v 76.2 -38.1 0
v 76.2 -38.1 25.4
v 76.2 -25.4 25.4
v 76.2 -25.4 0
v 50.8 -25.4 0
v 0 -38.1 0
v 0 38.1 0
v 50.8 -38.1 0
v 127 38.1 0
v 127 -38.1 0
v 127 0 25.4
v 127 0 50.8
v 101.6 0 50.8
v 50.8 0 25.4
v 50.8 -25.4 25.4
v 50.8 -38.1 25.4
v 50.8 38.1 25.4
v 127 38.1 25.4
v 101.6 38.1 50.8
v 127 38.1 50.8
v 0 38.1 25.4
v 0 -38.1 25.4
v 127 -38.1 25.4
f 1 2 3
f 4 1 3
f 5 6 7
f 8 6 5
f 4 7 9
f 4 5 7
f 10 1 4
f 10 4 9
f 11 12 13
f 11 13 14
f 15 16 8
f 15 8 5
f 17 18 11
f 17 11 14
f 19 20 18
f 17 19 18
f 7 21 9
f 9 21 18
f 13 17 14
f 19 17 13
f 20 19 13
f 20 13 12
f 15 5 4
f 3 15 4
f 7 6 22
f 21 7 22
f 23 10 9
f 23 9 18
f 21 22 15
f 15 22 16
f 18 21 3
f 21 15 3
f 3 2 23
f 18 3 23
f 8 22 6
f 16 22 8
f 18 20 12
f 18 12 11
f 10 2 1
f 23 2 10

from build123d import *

# Parameters (mm, degrees)
F0_W     = 127
F0_H     = 25.4
F1_DEPTH = 38.1
F3_DEPTH = 38.1
F4_W     = 25.4
F4_H     = 12.7
F5_DEPTH = 25.401


with BuildPart() as f1:
    # F0 (on Front) → F1 (new body, symmetric)
    with BuildSketch(Plane.XZ):
        with Locations((63.5, 12.7)):
            Rectangle(F0_W, F0_H)
    extrude(amount=F1_DEPTH, both=True)

    # F4 (on face) → F5 (cut, through all)
    with BuildSketch(Plane.XY.offset(25.4)):
        with Locations((63.5, -31.75)):
            Rectangle(F4_W, F4_H)
    extrude(amount=-F5_DEPTH, mode=Mode.SUBTRACT)


with BuildPart() as f3:
    # F2 (on face) → F3 (new body)
    with BuildSketch(Plane(origin=(0, 38.1, 0), x_dir=(-1, 0, 0), z_dir=(0, 1, 0))):
        Polygon((-127, 50.8), (-127, 25.4), (-50.8, 25.4), (-101.6, 50.8), align=None)
    extrude(amount=-F3_DEPTH)


solid = Compound([f1.part, f3.part])
